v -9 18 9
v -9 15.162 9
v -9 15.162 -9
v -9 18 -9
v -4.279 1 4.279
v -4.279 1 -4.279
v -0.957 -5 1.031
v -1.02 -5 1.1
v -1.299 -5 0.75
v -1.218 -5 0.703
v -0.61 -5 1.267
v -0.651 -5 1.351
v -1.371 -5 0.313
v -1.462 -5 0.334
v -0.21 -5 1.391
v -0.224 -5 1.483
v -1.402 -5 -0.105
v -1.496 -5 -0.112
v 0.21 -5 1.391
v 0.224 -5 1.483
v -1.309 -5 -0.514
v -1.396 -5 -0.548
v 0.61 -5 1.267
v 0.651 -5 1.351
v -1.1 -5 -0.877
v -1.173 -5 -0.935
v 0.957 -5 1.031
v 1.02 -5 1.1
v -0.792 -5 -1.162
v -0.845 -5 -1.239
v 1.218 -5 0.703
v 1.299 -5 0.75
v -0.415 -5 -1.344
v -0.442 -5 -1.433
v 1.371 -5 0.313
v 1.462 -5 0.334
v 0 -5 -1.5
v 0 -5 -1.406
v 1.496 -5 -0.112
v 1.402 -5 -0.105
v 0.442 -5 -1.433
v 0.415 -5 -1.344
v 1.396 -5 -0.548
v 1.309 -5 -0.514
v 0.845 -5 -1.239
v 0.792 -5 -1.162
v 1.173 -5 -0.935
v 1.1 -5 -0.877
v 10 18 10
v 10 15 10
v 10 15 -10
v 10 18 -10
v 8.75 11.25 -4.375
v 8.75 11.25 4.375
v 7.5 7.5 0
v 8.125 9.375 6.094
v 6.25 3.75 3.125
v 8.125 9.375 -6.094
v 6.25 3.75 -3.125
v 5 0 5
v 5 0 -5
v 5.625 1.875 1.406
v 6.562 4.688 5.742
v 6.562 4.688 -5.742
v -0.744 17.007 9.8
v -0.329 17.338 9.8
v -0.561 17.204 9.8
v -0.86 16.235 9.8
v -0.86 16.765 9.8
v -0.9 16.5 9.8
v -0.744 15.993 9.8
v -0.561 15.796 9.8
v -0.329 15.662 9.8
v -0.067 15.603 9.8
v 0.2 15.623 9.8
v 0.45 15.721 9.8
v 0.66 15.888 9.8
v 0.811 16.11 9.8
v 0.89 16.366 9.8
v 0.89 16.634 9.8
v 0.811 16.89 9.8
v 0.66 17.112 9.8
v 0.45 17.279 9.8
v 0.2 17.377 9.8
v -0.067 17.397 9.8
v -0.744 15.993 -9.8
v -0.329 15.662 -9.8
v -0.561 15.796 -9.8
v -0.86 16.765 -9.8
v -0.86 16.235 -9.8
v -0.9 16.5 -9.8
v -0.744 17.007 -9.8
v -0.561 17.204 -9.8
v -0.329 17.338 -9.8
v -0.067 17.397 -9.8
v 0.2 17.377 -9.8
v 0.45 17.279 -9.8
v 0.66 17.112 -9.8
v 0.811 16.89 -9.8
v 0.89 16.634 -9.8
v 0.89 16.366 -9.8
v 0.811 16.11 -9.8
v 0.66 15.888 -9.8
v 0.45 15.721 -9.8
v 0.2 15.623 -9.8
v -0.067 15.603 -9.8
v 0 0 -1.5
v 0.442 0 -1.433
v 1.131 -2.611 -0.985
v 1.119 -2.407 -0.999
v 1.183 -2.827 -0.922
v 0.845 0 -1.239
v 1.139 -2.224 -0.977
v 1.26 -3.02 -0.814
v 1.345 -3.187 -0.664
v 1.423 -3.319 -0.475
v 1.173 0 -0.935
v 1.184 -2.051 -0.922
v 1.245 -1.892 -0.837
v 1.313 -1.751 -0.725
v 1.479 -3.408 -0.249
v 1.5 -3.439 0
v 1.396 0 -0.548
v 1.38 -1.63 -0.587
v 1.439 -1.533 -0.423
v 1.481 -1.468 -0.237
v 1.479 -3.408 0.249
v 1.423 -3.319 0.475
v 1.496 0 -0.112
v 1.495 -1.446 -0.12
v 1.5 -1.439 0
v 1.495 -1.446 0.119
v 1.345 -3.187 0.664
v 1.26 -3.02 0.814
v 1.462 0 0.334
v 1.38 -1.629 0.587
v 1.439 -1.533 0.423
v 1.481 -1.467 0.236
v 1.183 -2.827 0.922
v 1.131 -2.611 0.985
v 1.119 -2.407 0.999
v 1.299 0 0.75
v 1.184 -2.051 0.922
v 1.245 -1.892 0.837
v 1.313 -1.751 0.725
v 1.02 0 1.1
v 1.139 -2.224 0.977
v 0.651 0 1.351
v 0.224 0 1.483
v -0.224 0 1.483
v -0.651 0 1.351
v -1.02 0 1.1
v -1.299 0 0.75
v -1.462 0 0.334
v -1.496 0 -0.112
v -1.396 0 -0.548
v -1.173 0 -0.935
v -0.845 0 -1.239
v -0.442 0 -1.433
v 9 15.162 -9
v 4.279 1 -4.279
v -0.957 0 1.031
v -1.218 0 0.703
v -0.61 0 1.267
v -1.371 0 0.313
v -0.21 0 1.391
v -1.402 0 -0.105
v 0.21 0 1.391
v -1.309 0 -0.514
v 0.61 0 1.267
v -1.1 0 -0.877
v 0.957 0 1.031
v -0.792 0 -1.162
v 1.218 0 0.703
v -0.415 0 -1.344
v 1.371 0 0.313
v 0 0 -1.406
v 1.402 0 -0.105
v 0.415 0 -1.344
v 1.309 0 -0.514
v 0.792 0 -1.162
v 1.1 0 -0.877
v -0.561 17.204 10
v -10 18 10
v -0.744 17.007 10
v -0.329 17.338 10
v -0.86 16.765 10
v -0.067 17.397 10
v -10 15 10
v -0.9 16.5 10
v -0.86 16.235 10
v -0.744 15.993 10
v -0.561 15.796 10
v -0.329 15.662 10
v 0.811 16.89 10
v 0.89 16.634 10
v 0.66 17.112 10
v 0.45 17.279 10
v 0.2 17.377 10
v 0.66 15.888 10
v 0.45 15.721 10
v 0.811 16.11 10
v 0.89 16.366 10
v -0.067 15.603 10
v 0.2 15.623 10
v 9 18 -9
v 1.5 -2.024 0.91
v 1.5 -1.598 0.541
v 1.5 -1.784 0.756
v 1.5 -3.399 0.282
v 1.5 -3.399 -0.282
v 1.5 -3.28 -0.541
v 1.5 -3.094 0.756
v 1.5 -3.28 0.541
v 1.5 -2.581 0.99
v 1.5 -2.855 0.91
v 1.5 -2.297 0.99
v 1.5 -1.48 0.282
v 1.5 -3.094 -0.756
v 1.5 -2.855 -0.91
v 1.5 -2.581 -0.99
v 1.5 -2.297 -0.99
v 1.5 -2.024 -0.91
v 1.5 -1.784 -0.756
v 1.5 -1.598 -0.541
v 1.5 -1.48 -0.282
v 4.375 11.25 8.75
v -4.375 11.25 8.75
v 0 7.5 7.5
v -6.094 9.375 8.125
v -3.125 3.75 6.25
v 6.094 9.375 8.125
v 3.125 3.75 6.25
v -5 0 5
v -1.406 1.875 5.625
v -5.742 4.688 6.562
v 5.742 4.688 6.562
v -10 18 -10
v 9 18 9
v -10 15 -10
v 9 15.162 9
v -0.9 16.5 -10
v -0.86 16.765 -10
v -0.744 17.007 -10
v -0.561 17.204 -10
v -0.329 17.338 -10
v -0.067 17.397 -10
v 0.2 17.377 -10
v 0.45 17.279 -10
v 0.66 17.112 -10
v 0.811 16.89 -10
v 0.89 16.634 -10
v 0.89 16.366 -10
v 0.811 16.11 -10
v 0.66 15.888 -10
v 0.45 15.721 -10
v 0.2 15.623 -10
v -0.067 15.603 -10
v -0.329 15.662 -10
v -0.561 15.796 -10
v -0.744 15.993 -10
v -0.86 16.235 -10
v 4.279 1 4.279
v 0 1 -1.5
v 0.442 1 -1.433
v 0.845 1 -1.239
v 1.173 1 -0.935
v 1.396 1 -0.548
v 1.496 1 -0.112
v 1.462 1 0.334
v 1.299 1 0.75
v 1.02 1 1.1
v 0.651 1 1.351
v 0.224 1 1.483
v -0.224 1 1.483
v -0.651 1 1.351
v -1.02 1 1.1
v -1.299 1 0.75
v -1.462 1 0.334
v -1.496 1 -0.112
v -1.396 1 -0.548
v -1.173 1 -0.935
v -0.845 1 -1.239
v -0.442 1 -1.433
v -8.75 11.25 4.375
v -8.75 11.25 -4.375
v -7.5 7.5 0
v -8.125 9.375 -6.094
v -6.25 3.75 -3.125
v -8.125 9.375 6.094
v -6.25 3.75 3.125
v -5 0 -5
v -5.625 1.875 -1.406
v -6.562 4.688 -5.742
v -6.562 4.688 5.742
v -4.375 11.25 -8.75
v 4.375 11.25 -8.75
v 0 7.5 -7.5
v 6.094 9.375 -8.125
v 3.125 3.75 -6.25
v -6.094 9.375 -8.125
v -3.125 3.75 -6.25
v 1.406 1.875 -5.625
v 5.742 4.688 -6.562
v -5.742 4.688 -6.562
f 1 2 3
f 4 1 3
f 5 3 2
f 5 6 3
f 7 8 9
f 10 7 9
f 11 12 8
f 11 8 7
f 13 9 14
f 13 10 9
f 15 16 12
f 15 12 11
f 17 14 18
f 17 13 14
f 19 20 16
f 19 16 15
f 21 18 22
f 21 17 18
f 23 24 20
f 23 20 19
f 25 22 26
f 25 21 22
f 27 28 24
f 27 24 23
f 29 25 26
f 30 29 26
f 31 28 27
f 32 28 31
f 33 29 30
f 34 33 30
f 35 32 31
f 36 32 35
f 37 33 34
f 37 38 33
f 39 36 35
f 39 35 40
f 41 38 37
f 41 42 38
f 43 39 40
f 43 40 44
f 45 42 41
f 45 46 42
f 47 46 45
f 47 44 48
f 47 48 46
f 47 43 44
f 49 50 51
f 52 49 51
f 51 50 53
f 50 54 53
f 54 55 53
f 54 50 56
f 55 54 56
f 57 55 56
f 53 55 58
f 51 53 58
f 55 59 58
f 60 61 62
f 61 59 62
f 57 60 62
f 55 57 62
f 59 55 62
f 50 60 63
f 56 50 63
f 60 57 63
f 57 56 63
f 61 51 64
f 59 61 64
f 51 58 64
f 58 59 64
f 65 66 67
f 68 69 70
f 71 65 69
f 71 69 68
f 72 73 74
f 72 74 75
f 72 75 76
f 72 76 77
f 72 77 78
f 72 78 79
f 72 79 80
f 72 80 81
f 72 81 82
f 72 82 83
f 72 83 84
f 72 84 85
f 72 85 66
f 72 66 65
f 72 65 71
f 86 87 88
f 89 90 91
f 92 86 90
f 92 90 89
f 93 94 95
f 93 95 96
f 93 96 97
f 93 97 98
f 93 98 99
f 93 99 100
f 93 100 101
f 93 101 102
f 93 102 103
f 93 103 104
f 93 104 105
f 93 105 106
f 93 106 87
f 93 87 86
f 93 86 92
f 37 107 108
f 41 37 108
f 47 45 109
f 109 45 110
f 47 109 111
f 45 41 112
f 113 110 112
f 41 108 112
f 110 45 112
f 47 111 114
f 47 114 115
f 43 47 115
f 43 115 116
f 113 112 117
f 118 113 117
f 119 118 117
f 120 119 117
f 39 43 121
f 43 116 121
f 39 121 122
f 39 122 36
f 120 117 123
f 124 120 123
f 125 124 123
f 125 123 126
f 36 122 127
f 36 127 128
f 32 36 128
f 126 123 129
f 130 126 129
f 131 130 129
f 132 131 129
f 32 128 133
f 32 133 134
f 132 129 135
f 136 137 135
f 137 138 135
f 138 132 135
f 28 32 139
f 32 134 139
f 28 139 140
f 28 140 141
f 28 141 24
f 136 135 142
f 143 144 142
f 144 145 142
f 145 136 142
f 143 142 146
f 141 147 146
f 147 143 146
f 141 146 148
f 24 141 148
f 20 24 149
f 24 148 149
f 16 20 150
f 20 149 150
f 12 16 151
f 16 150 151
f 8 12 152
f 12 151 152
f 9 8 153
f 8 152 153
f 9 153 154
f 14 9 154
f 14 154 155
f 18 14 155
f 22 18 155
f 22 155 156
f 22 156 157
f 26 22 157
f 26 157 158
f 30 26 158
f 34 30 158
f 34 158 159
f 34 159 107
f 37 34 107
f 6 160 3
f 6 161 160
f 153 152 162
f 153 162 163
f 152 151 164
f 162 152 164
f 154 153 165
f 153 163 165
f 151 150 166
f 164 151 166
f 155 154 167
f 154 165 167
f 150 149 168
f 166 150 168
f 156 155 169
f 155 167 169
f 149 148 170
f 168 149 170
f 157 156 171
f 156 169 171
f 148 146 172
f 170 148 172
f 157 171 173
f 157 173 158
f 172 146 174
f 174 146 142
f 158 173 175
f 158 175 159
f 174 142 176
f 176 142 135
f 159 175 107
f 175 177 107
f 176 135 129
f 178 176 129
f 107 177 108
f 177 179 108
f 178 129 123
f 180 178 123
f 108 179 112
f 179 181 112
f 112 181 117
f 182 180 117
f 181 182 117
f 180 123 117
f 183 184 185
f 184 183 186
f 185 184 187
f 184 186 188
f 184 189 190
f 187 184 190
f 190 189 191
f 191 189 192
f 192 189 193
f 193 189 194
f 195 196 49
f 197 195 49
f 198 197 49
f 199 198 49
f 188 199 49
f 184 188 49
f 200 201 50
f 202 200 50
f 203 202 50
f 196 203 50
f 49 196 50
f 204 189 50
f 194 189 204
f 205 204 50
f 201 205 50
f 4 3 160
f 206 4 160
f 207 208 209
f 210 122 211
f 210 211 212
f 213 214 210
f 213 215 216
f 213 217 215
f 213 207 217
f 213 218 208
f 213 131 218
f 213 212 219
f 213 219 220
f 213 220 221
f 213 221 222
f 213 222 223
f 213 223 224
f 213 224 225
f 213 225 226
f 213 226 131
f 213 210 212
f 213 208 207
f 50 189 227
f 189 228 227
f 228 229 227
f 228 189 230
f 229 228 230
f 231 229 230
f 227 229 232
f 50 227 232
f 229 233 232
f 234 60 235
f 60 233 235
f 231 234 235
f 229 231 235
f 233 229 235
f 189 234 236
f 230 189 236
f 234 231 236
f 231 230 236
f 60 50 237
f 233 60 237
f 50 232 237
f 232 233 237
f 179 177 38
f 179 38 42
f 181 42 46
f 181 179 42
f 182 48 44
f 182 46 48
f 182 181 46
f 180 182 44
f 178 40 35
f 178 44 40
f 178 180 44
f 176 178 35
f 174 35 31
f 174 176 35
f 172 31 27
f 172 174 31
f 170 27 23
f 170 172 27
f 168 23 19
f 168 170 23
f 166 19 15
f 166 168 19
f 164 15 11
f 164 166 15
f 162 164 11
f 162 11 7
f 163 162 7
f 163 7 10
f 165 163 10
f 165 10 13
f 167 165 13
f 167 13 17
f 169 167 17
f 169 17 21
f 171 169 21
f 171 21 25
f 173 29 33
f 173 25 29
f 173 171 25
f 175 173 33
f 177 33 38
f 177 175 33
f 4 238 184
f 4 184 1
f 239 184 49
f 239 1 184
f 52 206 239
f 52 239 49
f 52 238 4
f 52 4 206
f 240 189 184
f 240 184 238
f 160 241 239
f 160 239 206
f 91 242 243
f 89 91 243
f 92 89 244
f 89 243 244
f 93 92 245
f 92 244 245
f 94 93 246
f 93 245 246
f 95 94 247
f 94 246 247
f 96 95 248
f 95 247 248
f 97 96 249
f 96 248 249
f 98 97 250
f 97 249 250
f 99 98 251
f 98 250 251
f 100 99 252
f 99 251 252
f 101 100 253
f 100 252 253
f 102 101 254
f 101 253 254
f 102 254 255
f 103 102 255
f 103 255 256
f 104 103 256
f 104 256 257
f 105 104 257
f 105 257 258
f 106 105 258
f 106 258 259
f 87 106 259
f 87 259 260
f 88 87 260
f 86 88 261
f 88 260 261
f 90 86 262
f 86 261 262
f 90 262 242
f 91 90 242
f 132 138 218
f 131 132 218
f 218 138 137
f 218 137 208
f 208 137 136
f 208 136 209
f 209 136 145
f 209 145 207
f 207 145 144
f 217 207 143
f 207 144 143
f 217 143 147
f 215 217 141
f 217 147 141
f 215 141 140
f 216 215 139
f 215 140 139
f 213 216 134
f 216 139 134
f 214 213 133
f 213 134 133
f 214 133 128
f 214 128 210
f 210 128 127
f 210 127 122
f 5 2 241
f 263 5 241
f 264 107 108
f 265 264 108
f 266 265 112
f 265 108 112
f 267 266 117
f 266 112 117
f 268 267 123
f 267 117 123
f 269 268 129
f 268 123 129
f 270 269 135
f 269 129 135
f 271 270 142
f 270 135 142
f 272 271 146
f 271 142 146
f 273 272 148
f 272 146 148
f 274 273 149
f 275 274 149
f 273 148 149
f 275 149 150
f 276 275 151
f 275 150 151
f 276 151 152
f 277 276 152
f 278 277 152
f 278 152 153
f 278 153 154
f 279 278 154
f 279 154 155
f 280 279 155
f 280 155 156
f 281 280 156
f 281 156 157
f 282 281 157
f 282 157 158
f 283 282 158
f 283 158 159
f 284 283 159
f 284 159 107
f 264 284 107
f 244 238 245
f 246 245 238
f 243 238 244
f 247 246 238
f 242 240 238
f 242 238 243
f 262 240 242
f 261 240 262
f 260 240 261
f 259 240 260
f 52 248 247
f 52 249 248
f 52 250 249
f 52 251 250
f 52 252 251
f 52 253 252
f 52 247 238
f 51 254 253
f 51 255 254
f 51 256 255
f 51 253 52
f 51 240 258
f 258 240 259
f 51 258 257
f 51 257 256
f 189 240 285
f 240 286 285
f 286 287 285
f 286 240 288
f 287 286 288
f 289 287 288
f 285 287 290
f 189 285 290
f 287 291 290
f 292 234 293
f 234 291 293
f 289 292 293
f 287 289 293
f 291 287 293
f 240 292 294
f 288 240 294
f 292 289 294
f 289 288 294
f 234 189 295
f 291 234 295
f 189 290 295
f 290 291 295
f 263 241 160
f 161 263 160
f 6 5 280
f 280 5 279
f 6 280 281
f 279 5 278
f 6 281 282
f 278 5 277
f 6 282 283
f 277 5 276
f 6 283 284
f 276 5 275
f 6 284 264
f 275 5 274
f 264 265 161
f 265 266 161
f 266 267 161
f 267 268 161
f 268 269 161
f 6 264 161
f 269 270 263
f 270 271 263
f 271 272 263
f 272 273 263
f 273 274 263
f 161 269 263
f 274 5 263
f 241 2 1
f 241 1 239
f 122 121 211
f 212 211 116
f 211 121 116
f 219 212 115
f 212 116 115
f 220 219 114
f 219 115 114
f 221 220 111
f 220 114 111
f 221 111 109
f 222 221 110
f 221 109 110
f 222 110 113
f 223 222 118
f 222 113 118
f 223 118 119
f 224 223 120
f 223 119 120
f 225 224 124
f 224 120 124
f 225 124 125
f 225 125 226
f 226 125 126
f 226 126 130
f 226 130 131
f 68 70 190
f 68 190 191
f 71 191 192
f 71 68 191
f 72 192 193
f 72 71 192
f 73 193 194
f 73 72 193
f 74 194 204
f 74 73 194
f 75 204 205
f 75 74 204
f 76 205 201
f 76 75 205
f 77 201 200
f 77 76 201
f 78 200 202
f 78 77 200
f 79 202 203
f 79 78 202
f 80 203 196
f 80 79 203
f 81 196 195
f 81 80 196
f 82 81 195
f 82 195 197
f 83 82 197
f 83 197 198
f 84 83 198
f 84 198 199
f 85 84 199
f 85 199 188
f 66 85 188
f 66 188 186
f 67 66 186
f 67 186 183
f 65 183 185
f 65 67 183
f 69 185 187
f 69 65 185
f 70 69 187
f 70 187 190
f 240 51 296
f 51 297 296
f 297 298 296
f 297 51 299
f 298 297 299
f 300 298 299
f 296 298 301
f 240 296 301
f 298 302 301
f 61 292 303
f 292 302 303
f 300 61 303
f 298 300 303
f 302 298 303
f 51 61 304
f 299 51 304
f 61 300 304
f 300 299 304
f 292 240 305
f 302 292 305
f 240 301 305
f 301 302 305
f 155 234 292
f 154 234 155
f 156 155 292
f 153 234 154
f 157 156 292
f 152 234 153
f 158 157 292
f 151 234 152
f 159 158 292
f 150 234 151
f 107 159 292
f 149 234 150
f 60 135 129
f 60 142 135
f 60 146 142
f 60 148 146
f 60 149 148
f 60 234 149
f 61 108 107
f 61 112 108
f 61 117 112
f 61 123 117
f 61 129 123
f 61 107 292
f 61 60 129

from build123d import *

# Parameters (mm, degrees)
CROQUIS3_W                 = 20
CROQUIS3_H                 = 20
SALIENTE_EXTRUIR1_DEPTH    = 3
VACIADO2_T                 = -1
CROQUIS4_R                 = 1.5
CORTAR_EXTRUIR1_DEPTH      = 3
CROQUIS5_R                 = 1.5
SALIENTE_EXTRUIR2_DEPTH    = 5
CROQUIS6_R                 = 1.355898714
CORTAR_EXTRUIR2_DEPTH      = 15
CROQUIS7_R                 = 1
SALIENTE_EXTRUIR4_DEPTH    = 1.5
CORTAR_EXTRUIR3_DEPTH      = 31.5
CORTAR_EXTRUIR3_DEPTH_BACK = 1.5
CROQUIS10_R                = 1.406391719
CROQUIS11_R                = 0.9
CORTAR_EXTRUIR4_DEPTH      = 0.2
CORTAR_EXTRUIR5_START      = -0.2
CROQUIS12_R                = 0.9
CORTAR_EXTRUIR5_DEPTH      = 0.2


with BuildPart() as part:
    # Croquis2 → Recubrir1 section 0
    with BuildSketch(Plane(origin=(0, 15, 0), x_dir=(1, 0, 0), z_dir=(0, 1, 0))):
        with BuildLine():
            Line((-10, -10), (10, -10))
            Line((10, -10), (10, 10))
            Line((10, 10), (-10, 10))
            Line((-10, 10), (-10, -10))
        make_face()
    # Croquis1 → Recubrir1 section 1
    with BuildSketch(Plane(origin=(0, 0, 0), x_dir=(1, 0, 0), z_dir=(0, 1, 0))):
        with BuildLine():
            Line((-5, -5), (5, -5))
            Line((5, -5), (5, 5))
            Line((5, 5), (-5, 5))
            Line((-5, 5), (-5, -5))
        make_face()
    loft()

    # Croquis3 → Saliente-Extruir1 (add)
    with BuildSketch(Plane(origin=(0, 15, 0), x_dir=(1, 0, 0), z_dir=(0, 1, 0))):
        Rectangle(CROQUIS3_W, CROQUIS3_H)
    extrude(amount=SALIENTE_EXTRUIR1_DEPTH)

    # Vaciado2
    vaciado2_openings = [part.faces().sort_by_distance(p)[0] for p in [
        (0, 18, 0),
    ]]
    offset(amount=VACIADO2_T, openings=vaciado2_openings, kind=Kind.INTERSECTION)

    # Croquis4 → Cortar-Extruir1 (cut)
    with BuildSketch(Plane(origin=(0, 0, 0), x_dir=(-1, 0, 0), z_dir=(0, -1, 0))):
        with Locations(Location((0, 0, 0), (0, 0, 90))):
            Circle(CROQUIS4_R)
    extrude(amount=-CORTAR_EXTRUIR1_DEPTH, mode=Mode.SUBTRACT)

    # Croquis11 → Cortar-Extruir4 (cut)
    with BuildSketch(Plane(origin=(0, 0, -10), x_dir=(-1, 0, 0), z_dir=(0, 0, -1))):
        with Locations((0, 16.5)):
            Circle(CROQUIS11_R)
    extrude(amount=-CORTAR_EXTRUIR4_DEPTH, mode=Mode.SUBTRACT)

    # Croquis12 → Cortar-Extruir5 (cut)
    with BuildSketch(Plane.XY.offset(10).offset(CORTAR_EXTRUIR5_START)):
        with Locations(Location((0, 16.5, 0), (0, 0, 180))):
            Circle(CROQUIS12_R)
    extrude(amount=CORTAR_EXTRUIR5_DEPTH, mode=Mode.SUBTRACT)


with BuildPart() as body_2:
    # Croquis5 → Saliente-Extruir2 (new body)
    with BuildSketch(Plane(origin=(0, 0, 0), x_dir=(-1, 0, 0), z_dir=(0, -1, 0))):
        with Locations(Location((0, 0, 0), (0, 0, 90))):
            Circle(CROQUIS5_R)
    extrude(amount=SALIENTE_EXTRUIR2_DEPTH)

    # Croquis6 → Cortar-Extruir2 (cut)
    with BuildSketch(Plane(origin=(0, -5, 0), x_dir=(-1, 0, 0), z_dir=(0, -1, 0))):
        with Locations(Location((0, 0, 0), (0, 0, 90))):
            Circle(CROQUIS6_R)
    extrude(amount=-CORTAR_EXTRUIR2_DEPTH, mode=Mode.SUBTRACT)

    # Croquis7 → Saliente-Extruir4 (add)
    with BuildSketch(Plane(origin=(0, 0, 0), x_dir=(0, 0, -1), z_dir=(1, 0, 0))):
        with Locations(Location((0, -2.4391778, 0), (0, 0, 180))):
            Circle(CROQUIS7_R)
    extrude(amount=SALIENTE_EXTRUIR4_DEPTH)

    # Croquis10 → Cortar-Extruir3 (cut, two sides: drawn at the far end of the back side and taken through both)
    with BuildSketch(Plane(origin=(0, 0, 0), x_dir=(-1, 0, 0), z_dir=(0, -1, 0)).offset(-CORTAR_EXTRUIR3_DEPTH_BACK)):
        with Locations(Location((0, 0, 0), (0, 0, 90))):
            Circle(CROQUIS10_R)
    extrude(amount=CORTAR_EXTRUIR3_DEPTH + CORTAR_EXTRUIR3_DEPTH_BACK, mode=Mode.SUBTRACT)


solid = Compound([part.part, body_2.part])
